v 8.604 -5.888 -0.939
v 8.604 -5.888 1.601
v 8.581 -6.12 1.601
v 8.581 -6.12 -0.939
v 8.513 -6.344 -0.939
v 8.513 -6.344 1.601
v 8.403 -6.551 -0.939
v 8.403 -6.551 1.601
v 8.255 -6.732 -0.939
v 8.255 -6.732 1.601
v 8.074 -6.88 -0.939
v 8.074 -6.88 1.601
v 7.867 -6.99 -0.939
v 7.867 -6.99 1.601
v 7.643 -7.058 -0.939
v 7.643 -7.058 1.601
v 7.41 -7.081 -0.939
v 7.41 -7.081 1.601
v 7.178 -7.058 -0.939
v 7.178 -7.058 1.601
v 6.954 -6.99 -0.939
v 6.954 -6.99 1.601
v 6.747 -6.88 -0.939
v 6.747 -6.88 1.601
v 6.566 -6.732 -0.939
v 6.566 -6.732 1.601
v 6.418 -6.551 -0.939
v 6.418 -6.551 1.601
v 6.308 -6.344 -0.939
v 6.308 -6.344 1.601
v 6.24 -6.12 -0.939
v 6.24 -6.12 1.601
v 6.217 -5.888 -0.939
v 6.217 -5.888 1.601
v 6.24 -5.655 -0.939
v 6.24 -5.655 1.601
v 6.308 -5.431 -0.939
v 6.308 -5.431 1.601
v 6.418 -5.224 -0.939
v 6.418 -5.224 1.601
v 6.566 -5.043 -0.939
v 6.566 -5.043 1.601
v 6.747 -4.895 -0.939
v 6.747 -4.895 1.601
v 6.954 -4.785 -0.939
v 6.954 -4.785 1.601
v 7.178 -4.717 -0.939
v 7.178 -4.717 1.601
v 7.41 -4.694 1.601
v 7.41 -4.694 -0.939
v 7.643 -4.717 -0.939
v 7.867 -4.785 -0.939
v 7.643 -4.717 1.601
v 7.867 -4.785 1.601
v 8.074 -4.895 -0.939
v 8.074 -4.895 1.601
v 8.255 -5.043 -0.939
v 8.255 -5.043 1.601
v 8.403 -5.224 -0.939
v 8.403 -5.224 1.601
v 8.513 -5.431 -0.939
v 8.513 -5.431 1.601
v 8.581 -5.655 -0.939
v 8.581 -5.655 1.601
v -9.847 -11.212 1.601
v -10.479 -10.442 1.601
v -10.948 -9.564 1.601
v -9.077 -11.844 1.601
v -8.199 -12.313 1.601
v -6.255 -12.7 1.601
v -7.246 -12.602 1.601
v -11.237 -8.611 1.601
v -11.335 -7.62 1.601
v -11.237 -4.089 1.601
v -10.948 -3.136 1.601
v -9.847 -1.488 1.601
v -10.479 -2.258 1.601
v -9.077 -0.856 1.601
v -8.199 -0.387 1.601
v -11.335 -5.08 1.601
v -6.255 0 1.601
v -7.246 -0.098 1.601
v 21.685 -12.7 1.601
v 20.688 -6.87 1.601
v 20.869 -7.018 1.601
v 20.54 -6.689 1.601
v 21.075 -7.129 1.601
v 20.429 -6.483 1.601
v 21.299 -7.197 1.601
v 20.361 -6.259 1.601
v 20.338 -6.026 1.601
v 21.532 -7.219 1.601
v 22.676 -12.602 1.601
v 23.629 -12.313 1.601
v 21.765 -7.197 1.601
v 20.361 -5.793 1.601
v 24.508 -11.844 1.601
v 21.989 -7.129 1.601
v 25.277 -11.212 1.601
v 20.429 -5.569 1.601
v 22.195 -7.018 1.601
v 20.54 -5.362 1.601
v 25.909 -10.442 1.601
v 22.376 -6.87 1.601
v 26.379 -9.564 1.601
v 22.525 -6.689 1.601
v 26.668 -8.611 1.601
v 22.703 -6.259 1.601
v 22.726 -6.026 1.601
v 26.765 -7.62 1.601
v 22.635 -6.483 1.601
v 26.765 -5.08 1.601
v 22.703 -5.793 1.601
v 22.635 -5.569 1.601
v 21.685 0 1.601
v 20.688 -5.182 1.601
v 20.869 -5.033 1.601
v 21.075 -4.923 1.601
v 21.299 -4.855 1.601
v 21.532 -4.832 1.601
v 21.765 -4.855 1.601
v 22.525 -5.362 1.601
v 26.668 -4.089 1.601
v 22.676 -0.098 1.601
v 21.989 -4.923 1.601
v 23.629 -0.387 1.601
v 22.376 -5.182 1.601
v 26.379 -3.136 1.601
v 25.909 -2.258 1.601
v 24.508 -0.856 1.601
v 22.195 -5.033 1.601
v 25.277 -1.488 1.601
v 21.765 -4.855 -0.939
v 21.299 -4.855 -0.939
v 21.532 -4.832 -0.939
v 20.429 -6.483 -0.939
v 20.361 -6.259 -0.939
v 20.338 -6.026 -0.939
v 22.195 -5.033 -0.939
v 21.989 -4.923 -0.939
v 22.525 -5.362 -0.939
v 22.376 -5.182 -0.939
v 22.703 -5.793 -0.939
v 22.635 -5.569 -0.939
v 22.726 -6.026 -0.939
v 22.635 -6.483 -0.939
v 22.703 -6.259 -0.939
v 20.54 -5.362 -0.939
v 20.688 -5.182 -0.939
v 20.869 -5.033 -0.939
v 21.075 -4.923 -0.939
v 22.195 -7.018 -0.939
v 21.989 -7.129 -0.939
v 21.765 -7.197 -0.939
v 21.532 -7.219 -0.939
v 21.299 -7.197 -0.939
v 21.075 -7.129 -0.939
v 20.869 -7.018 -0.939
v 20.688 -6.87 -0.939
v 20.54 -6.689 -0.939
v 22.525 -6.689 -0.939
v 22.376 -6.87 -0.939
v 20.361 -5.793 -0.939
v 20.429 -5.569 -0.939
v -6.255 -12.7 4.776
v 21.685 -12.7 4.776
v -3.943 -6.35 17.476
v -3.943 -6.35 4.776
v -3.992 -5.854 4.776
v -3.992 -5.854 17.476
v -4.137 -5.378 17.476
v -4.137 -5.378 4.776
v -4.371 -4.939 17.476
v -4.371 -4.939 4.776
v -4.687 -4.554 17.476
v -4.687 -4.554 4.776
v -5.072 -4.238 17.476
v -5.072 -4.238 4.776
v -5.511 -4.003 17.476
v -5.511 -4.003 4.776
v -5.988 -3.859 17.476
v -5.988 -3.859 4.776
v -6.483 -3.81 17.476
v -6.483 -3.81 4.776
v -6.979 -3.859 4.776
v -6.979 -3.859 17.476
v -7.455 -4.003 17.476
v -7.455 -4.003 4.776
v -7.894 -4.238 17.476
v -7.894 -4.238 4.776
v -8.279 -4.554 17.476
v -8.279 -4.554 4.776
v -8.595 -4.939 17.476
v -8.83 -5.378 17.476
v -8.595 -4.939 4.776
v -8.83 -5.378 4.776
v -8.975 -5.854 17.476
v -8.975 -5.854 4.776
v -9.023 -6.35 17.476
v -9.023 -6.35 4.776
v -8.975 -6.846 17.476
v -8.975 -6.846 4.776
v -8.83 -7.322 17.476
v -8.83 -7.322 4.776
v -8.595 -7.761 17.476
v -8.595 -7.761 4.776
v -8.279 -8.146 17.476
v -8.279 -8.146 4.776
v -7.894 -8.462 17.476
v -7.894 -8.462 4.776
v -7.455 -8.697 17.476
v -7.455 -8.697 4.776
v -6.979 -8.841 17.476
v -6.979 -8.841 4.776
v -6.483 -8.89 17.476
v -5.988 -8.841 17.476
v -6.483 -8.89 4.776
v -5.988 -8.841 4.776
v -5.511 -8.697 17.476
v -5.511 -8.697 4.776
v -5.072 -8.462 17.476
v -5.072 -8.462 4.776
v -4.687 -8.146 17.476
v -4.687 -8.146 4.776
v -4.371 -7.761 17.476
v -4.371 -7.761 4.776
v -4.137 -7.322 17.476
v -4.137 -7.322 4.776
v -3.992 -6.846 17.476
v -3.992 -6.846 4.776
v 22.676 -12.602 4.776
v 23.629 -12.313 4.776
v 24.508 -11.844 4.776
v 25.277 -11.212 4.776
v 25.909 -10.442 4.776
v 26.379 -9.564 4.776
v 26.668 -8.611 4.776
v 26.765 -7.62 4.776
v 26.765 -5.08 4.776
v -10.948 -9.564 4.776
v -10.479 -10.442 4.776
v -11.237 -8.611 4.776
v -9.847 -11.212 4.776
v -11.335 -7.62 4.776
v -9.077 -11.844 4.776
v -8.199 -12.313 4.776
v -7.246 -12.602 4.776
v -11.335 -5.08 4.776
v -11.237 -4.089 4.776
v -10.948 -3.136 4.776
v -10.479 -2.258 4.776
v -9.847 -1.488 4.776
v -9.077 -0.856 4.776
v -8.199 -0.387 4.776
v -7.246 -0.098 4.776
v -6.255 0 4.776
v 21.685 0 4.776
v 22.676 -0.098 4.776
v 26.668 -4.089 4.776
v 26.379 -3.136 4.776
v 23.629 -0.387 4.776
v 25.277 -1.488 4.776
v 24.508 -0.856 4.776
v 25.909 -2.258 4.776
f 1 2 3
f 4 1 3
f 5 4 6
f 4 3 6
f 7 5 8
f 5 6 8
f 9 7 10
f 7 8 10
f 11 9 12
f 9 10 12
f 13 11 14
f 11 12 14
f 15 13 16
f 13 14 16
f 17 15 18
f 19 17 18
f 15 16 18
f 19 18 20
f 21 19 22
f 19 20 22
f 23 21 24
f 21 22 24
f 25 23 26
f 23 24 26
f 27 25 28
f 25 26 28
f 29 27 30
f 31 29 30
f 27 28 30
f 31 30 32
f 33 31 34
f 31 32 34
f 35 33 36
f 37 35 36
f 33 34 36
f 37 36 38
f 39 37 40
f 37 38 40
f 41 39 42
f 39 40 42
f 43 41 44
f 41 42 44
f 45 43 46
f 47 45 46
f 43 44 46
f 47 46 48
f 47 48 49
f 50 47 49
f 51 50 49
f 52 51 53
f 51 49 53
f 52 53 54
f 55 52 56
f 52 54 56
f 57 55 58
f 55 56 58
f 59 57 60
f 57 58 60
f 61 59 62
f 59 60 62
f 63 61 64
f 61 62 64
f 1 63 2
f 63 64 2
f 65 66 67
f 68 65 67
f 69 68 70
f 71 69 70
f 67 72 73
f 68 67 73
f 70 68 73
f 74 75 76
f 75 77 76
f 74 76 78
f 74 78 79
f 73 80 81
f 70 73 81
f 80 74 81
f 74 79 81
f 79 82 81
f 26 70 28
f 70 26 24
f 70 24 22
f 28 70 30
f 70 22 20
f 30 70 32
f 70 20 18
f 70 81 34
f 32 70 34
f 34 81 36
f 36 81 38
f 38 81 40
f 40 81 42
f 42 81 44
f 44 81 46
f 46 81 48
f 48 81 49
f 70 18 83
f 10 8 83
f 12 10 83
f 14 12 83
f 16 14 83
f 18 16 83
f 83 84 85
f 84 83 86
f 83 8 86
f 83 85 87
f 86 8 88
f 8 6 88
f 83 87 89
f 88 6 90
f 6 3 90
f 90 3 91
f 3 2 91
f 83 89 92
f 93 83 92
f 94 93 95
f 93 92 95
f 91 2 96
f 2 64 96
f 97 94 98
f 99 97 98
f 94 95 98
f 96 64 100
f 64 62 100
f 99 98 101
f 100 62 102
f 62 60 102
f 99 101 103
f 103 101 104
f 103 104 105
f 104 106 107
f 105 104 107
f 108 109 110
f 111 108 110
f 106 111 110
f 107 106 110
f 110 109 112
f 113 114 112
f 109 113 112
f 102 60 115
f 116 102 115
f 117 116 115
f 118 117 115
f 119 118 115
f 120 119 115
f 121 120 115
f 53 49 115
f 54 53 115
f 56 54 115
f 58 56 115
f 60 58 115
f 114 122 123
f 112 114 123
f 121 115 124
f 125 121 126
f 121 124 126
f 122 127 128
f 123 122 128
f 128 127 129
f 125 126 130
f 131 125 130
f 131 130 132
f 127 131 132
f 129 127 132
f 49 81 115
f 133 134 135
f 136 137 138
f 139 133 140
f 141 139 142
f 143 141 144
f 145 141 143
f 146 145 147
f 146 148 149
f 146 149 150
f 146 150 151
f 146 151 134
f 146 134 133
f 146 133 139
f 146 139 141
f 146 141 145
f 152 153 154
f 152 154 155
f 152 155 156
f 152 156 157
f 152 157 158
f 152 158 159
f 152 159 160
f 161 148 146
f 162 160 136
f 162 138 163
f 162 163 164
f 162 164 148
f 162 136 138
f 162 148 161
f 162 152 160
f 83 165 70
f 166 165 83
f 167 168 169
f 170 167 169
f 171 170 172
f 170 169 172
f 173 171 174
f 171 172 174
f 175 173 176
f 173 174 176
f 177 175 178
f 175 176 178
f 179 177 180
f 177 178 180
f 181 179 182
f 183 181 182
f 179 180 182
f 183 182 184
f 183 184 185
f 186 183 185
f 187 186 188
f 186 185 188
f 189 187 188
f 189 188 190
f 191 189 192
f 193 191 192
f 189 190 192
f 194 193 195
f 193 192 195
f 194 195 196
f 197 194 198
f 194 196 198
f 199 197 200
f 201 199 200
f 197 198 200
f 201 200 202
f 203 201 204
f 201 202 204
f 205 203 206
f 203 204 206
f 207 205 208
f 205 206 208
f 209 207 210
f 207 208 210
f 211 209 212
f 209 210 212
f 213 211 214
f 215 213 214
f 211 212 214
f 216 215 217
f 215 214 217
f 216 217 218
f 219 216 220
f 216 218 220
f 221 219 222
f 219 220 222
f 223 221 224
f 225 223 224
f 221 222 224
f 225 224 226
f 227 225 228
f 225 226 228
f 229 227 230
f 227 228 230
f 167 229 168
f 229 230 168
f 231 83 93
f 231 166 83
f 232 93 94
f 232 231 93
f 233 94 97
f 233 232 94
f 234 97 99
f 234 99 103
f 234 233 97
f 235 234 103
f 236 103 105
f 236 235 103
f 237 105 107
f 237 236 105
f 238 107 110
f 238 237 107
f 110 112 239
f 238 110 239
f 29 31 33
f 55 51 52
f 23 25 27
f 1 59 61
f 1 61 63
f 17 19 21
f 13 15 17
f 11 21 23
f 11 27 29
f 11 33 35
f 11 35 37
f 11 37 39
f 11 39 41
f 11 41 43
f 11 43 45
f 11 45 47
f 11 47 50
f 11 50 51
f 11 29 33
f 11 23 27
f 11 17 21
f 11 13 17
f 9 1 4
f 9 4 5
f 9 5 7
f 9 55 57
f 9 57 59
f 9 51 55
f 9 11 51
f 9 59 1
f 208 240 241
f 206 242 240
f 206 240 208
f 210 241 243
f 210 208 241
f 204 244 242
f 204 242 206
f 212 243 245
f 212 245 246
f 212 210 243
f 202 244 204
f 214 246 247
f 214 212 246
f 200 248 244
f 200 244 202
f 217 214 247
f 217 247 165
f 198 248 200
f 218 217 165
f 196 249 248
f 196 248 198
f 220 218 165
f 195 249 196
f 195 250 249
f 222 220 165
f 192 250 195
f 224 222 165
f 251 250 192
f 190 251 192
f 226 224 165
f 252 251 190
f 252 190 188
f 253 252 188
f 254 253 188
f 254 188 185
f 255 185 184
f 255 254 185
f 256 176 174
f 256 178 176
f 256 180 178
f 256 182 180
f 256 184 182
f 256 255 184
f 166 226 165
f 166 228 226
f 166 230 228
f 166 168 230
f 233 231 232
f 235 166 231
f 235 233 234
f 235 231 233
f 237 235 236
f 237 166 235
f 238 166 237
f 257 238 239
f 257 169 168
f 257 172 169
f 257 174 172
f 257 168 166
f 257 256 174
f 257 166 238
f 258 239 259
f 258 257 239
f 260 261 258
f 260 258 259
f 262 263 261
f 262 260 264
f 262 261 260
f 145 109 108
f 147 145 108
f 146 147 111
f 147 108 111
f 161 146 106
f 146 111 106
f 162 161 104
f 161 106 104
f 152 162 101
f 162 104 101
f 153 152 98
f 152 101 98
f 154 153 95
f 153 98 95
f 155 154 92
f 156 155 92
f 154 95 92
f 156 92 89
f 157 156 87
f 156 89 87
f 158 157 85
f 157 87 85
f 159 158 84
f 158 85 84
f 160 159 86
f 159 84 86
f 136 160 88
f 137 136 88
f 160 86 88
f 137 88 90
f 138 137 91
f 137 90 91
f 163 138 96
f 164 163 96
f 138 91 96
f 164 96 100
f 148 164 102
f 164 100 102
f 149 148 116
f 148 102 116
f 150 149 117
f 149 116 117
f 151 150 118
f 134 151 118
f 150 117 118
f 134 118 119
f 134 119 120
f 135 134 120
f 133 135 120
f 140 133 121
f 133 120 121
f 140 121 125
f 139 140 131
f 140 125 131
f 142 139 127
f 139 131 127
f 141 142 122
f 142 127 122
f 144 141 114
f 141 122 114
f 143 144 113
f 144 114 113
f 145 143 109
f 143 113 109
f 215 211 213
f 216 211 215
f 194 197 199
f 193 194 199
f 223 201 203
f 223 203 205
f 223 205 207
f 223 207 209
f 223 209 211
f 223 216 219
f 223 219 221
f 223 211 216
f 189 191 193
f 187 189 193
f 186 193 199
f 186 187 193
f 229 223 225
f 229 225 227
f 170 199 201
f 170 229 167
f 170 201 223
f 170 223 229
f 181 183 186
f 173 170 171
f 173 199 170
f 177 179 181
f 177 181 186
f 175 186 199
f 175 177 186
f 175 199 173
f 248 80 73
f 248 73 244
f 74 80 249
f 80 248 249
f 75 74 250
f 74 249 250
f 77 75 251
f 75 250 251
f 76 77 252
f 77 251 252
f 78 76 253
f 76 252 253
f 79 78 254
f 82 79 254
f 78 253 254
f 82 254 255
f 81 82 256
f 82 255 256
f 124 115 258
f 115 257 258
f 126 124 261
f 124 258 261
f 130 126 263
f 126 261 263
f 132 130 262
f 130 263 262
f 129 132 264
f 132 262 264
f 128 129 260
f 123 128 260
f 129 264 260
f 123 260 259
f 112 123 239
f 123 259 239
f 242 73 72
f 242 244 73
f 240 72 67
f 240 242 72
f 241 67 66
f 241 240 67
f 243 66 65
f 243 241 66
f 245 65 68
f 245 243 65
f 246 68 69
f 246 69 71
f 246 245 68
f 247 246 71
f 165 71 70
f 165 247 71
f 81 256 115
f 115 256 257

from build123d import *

# Parameters (mm, degrees)
F0_W     = 38.1
F0_H     = 3.175
F1_DEPTH = 12.7
F2_R     = 2.54
F3_DEPTH = 12.7
F4_R     = 1.1938
F5_DEPTH = 2.54
F6_R     = 1.1938
F7_DEPTH = 2.54
F8_R     = 5.08


with BuildPart() as f1:
    # F0 (on Front) → F1 (new body)
    with BuildSketch(Plane.XZ):
        with Locations((7.715251, 3.188805)):
            Rectangle(F0_W, F0_H)
    extrude(amount=F1_DEPTH)

    # F2 (on face) → F3 (join)
    with BuildSketch(Plane.XY.offset(4.776305)):
        with Locations((-6.483349, -6.35)):
            Circle(F2_R)
    extrude(amount=F3_DEPTH)

    # F4 (on face) → F5 (join)
    with BuildSketch(Plane(origin=(0, 0, 1.601305), x_dir=(1, 0, 0), z_dir=(0, 0, -1))):
        with Locations((7.410451, 5.887567)):
            Circle(F4_R)
    extrude(amount=F5_DEPTH)

    # F6 (on face) → F7 (join)
    with BuildSketch(Plane(origin=(0, 0, 1.601305), x_dir=(1, 0, 0), z_dir=(0, 0, -1))):
        with Locations((21.532176, 6.025657)):
            Circle(F6_R)
    extrude(amount=F7_DEPTH)

    # F8
    f8_edges = [f1.edges().sort_by_distance(p)[0] for p in [
        (-11.334749, -12.7, 3.188805),
        (-11.334749, 0, 3.188805),
        (26.765251, -12.7, 3.188805),
        (26.765251, 0, 3.188805),
    ]]
    fillet(f8_edges, radius=F8_R)


solid = f1.part
